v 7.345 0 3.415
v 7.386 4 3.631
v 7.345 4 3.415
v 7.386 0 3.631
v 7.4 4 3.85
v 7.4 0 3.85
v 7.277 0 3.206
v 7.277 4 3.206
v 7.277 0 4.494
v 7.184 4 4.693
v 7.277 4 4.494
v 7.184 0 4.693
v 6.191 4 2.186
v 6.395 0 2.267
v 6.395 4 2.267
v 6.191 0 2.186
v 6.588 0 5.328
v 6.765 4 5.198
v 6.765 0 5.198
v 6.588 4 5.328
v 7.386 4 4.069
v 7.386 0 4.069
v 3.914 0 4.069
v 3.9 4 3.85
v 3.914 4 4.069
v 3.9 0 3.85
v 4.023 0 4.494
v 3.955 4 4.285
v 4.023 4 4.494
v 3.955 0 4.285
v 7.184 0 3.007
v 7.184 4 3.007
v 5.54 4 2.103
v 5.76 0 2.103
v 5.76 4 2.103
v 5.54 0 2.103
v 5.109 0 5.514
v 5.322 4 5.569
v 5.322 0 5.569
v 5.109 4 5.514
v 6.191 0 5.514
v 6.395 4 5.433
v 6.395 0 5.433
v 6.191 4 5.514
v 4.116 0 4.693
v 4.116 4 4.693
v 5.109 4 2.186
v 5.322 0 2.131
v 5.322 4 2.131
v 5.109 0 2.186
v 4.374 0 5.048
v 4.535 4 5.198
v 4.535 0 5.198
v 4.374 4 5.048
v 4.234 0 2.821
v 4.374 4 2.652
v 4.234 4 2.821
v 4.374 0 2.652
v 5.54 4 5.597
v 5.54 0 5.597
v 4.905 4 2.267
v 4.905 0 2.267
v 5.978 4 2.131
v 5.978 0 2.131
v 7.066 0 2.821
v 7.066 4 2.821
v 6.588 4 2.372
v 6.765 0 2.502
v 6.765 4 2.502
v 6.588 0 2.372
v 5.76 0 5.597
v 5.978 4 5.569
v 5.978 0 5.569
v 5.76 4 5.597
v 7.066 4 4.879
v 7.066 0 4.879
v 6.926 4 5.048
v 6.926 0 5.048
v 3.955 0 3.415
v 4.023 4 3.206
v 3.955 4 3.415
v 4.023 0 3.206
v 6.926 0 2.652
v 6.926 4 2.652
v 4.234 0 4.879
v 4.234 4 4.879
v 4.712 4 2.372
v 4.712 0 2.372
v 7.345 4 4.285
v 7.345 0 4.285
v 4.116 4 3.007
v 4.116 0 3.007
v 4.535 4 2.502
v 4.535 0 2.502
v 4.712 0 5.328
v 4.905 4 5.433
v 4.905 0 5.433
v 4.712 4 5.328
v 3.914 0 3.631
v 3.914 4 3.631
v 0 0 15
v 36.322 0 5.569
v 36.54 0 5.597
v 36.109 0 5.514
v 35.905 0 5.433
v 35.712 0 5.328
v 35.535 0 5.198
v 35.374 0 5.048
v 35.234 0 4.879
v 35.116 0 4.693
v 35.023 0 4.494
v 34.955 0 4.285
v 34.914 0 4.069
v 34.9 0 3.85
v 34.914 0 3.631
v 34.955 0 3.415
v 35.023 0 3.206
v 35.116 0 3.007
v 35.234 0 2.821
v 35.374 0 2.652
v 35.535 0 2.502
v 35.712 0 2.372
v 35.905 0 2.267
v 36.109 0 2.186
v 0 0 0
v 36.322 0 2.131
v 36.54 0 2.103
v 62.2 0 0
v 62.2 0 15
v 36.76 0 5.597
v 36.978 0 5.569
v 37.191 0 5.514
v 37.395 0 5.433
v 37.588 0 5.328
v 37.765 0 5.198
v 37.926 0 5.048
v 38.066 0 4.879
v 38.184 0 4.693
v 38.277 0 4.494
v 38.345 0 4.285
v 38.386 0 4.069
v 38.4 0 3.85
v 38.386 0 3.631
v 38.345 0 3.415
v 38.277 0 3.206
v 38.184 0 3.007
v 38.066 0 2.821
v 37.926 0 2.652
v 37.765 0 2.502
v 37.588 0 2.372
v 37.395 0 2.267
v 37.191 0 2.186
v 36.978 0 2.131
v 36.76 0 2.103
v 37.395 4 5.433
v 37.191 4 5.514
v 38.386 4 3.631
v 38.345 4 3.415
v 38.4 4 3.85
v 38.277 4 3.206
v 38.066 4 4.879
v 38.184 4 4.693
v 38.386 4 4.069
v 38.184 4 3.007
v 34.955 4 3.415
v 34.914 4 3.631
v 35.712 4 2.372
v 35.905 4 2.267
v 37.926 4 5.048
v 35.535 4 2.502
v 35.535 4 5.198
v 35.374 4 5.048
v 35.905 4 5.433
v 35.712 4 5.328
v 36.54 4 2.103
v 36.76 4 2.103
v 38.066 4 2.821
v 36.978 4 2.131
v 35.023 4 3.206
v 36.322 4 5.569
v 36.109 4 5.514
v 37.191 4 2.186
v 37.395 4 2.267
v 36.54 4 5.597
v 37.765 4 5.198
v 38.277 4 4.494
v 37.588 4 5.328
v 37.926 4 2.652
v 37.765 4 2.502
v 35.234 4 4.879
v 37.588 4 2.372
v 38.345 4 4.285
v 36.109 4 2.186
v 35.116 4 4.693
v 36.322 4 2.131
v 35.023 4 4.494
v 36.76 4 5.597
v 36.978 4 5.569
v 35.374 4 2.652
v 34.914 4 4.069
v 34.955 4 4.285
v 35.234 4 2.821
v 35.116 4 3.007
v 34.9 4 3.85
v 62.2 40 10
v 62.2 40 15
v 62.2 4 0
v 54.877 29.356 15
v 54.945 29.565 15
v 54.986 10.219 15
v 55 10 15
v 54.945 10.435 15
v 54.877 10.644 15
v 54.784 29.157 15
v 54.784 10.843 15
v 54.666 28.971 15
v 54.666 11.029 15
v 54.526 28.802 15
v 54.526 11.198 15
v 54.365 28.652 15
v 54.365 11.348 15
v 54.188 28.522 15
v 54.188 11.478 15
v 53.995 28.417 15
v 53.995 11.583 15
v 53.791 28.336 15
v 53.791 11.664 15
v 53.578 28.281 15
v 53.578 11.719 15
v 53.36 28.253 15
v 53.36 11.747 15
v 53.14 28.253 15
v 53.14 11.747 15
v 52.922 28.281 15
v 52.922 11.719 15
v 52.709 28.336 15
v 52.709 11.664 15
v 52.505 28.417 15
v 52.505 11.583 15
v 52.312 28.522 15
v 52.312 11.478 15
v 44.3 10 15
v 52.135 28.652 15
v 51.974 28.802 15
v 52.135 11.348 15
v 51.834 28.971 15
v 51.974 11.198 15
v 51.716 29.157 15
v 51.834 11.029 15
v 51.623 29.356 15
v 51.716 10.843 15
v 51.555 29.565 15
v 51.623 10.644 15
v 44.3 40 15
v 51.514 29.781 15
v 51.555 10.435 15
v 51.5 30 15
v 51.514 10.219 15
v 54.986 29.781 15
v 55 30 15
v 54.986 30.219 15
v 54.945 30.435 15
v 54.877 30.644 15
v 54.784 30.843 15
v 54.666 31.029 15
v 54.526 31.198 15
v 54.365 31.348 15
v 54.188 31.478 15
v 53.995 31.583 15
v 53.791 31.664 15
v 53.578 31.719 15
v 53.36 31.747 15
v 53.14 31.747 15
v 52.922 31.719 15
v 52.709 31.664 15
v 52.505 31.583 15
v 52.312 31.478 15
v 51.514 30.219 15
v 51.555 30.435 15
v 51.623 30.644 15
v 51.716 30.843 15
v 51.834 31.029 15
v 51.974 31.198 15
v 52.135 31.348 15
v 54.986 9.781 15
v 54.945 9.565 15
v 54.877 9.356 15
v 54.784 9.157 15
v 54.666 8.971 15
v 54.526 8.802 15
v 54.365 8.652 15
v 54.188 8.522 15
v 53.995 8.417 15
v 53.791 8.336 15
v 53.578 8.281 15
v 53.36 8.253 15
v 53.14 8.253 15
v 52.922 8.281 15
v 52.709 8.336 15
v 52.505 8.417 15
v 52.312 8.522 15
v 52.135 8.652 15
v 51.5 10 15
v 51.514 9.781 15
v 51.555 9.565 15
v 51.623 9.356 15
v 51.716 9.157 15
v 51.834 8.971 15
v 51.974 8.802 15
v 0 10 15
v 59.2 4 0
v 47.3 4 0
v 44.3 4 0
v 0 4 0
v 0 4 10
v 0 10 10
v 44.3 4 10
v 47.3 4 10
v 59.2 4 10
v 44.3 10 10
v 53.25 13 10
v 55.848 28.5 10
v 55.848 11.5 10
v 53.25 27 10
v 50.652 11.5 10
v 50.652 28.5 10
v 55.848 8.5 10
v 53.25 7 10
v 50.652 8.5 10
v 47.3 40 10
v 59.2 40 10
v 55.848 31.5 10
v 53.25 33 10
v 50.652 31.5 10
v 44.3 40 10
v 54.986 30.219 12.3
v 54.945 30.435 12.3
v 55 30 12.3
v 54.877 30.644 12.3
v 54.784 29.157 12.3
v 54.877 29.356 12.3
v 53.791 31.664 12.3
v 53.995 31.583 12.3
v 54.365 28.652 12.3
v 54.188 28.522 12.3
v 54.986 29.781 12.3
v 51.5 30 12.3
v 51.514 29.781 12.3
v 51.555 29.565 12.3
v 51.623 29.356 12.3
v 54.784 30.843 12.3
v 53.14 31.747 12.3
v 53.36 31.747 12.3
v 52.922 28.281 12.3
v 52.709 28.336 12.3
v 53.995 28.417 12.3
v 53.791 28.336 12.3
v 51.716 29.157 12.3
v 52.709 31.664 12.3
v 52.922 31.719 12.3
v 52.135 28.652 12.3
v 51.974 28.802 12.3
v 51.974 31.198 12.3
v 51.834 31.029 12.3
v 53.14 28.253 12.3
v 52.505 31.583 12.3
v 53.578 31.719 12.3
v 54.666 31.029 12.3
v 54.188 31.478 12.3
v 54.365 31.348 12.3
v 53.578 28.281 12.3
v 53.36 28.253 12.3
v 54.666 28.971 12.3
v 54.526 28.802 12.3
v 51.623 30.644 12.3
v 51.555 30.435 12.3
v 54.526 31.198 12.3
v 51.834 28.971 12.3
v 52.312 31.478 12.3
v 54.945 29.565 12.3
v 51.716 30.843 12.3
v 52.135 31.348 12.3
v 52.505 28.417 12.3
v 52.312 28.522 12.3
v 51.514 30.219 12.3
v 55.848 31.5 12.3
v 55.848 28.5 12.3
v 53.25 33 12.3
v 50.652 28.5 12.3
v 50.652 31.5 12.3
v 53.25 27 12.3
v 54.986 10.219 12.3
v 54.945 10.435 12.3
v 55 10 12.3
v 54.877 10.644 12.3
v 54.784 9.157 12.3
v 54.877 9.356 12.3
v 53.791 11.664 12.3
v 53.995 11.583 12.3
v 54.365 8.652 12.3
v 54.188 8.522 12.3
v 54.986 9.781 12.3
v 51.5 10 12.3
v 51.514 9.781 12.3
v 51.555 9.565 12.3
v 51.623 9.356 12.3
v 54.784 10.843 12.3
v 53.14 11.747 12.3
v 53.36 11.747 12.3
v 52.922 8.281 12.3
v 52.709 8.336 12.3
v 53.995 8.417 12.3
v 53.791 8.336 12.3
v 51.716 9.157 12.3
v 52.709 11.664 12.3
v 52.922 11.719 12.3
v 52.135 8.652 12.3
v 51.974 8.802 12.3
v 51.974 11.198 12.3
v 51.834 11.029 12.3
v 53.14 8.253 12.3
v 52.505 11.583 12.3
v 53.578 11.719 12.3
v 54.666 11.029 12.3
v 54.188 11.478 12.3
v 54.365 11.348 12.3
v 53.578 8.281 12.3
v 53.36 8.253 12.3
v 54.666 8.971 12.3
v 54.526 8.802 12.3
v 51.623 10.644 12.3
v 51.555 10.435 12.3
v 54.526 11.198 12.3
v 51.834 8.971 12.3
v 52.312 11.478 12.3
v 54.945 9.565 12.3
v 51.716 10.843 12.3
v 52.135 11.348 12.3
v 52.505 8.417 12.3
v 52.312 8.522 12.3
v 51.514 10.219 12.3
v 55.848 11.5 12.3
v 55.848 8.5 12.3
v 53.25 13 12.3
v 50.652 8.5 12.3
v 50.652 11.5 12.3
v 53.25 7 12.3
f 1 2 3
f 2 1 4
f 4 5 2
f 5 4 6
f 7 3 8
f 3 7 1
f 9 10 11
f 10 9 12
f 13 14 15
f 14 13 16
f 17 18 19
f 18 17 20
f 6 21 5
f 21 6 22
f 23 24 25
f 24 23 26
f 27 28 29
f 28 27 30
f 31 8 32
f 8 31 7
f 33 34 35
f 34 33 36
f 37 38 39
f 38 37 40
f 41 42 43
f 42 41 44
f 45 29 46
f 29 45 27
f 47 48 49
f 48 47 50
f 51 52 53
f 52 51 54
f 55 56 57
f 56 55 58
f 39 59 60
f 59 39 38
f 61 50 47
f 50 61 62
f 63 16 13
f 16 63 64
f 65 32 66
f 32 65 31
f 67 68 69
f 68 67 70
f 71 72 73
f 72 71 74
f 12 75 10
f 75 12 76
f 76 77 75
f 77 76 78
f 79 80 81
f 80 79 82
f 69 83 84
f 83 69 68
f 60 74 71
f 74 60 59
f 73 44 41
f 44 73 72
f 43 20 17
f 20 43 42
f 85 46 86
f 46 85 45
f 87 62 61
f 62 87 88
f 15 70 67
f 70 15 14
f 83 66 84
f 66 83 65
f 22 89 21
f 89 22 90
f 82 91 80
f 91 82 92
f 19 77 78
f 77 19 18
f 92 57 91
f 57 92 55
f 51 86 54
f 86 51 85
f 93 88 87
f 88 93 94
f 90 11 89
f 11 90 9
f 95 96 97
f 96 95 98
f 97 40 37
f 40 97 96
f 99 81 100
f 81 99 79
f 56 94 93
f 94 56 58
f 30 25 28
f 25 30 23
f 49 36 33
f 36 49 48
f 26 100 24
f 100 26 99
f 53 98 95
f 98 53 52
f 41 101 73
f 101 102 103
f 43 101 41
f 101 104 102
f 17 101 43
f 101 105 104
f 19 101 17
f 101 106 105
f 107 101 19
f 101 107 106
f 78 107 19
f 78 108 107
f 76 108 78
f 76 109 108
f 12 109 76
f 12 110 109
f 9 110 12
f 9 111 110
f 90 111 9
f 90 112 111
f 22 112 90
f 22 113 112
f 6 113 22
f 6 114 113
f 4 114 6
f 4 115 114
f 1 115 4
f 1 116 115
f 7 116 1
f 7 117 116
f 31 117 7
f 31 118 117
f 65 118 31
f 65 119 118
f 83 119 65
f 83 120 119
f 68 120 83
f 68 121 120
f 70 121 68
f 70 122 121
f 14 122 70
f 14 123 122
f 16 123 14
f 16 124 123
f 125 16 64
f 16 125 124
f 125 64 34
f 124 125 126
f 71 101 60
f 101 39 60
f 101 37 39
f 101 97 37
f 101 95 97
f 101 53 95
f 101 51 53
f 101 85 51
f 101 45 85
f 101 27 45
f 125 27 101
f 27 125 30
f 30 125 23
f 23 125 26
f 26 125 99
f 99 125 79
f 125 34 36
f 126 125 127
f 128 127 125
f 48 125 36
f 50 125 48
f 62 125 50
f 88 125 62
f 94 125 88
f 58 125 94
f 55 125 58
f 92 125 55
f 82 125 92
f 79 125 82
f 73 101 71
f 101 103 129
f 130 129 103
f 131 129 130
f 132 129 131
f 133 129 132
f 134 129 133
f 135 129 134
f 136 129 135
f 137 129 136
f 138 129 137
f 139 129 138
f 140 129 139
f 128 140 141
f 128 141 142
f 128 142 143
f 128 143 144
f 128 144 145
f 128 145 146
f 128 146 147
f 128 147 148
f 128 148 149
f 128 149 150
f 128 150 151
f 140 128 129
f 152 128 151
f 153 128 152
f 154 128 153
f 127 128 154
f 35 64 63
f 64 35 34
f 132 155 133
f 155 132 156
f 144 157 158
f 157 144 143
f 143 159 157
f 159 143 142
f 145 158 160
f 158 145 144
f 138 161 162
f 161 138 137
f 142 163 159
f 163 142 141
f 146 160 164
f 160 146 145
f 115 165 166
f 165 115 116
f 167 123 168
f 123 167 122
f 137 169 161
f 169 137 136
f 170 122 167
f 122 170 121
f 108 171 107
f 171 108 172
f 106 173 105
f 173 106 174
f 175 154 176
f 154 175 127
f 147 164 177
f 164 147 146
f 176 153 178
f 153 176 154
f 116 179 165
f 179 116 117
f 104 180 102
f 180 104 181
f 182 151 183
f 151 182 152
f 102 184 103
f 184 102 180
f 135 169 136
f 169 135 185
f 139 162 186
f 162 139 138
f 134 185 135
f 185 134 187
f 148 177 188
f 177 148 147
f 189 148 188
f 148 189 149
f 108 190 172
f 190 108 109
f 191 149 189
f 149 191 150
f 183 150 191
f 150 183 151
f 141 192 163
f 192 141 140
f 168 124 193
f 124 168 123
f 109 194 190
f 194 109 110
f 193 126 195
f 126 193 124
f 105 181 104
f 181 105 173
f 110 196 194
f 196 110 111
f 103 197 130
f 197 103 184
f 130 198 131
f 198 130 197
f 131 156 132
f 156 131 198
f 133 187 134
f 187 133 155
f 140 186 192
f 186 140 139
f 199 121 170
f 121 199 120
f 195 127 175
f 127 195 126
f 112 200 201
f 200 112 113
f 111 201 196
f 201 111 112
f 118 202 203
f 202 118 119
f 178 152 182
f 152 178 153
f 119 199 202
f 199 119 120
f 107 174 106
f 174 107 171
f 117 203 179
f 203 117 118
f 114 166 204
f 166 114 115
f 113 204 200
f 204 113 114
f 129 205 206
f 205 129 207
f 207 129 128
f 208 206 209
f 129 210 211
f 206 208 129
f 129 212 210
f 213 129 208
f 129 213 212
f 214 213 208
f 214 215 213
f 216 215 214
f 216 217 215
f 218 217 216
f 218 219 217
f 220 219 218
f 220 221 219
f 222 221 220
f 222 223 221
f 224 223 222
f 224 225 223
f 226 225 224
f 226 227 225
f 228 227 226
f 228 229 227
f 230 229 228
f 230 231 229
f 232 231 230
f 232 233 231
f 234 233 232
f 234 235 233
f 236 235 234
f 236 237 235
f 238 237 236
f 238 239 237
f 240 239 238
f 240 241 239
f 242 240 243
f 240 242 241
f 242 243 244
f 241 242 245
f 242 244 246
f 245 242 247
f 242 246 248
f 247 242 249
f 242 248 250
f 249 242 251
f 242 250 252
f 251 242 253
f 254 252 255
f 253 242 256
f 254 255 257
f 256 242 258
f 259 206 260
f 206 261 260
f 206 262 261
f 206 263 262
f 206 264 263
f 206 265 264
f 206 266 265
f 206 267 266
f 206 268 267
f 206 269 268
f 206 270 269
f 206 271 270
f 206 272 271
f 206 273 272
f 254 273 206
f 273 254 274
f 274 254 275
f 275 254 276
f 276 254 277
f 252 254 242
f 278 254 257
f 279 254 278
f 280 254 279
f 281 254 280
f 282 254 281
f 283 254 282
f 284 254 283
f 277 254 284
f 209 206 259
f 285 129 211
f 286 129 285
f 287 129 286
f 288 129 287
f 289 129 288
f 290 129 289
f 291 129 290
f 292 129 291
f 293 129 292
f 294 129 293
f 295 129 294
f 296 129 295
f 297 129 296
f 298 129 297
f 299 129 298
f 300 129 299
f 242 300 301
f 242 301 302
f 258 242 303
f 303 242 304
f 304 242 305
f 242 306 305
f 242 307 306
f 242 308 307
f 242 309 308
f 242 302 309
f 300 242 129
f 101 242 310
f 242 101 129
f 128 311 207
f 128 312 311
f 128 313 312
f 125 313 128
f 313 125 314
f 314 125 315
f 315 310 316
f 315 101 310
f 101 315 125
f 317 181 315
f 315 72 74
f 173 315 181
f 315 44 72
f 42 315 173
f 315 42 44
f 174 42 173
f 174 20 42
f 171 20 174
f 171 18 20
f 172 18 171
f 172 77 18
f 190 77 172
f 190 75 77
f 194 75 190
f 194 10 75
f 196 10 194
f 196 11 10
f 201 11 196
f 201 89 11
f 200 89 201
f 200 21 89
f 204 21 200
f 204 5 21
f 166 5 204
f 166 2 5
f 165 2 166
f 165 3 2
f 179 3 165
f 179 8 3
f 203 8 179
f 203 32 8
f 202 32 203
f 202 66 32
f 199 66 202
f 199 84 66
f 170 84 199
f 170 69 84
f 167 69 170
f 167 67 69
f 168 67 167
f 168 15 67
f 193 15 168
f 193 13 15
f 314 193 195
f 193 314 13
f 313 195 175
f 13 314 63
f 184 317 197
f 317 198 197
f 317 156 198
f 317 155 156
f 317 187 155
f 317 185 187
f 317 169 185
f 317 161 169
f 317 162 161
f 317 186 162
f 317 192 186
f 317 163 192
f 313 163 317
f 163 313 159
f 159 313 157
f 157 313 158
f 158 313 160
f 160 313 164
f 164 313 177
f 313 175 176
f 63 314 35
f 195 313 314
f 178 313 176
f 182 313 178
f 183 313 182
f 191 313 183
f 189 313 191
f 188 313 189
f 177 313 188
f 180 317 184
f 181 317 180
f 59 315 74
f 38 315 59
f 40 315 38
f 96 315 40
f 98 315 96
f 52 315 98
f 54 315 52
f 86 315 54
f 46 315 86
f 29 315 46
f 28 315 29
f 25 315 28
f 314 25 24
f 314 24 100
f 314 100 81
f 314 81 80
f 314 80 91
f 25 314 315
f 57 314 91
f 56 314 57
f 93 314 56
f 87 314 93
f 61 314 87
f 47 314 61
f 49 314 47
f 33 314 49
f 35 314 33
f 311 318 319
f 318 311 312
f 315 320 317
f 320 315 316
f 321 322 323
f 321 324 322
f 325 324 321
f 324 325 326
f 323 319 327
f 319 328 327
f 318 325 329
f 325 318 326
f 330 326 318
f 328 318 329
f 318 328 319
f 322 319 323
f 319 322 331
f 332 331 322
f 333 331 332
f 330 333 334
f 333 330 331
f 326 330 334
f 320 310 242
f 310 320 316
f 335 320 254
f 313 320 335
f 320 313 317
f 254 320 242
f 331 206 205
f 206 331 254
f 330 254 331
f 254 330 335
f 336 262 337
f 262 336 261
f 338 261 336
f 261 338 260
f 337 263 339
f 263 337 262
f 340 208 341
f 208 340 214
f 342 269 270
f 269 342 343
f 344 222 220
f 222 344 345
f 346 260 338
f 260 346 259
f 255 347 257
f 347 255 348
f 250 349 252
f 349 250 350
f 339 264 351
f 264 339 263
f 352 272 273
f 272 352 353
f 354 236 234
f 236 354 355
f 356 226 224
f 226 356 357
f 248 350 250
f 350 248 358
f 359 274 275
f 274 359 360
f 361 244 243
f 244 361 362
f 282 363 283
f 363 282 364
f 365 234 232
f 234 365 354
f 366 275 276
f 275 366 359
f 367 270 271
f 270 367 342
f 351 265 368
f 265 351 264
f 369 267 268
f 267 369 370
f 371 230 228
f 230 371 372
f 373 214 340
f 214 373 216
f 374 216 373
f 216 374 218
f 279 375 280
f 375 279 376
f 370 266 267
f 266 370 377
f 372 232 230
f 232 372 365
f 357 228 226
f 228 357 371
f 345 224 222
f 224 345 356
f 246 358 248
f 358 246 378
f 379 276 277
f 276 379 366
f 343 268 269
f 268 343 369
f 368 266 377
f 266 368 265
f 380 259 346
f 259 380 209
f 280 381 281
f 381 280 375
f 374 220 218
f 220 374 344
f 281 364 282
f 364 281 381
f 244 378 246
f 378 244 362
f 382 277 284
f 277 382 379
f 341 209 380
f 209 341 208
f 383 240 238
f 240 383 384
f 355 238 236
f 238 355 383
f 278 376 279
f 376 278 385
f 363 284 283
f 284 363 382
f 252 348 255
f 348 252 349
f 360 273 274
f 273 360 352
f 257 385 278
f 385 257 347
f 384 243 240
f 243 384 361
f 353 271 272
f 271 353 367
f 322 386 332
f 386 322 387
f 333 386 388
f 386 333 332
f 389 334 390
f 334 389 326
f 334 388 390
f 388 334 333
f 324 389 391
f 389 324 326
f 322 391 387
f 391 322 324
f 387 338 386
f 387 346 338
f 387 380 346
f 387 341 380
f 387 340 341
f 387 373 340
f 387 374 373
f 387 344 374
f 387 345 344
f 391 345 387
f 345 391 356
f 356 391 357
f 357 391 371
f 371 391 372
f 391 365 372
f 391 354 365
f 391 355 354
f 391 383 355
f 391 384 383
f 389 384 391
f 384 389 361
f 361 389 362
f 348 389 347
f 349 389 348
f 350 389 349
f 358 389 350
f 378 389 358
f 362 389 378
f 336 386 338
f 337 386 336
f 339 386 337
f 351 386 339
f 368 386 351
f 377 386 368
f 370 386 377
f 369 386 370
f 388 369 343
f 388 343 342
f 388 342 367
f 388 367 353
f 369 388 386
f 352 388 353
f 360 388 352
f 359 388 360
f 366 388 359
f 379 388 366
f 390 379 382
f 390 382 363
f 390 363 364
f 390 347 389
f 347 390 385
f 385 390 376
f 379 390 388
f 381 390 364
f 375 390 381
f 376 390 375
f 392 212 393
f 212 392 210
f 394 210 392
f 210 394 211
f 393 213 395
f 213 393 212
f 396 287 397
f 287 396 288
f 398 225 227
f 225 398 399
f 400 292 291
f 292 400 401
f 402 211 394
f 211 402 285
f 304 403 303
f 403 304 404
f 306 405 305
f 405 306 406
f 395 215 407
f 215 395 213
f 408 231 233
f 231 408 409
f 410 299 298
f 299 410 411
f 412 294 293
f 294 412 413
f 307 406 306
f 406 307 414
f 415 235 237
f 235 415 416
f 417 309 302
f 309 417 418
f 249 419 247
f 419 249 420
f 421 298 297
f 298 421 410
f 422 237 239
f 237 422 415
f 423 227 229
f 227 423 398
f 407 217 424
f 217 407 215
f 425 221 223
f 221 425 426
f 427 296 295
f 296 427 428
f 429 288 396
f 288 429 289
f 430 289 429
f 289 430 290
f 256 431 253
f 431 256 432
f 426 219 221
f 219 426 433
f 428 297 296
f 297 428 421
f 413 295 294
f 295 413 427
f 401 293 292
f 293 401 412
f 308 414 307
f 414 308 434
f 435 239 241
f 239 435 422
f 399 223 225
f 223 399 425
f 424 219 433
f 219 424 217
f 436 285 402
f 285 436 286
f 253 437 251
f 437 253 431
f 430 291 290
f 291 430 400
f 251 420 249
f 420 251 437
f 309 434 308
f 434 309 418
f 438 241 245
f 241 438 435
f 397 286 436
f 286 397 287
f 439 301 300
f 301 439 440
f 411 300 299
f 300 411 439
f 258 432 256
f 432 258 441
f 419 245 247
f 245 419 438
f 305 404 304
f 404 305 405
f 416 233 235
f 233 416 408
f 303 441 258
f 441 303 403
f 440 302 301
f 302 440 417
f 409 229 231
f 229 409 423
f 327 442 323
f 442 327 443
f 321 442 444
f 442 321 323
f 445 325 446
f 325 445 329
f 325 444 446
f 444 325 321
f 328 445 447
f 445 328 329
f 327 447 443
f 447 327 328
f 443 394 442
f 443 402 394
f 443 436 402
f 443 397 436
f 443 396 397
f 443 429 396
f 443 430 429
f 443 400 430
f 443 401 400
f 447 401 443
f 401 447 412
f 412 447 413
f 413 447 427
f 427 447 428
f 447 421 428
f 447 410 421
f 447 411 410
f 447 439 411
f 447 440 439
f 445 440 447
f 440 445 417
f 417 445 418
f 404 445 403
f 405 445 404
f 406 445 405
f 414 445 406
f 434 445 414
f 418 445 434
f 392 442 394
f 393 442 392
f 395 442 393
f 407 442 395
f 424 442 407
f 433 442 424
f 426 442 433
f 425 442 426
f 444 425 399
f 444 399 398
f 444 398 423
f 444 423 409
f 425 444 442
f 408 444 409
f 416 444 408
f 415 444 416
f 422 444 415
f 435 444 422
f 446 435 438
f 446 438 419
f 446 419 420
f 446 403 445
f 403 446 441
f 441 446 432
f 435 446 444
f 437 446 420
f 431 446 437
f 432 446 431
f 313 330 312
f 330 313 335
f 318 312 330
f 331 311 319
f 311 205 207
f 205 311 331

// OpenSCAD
//**********************************************
// Cable rail mount for MPCNC build
//
// Written by Ippokratis Anastasiadis 2018
// using OpenSCAD 2015.03-2
// 
// Description : the mount is attached to the top edge of the stepper motors
// of the upper axis of the MPCNC build and serves the purpose of supporting
// the cables coming from the Z axis, such as stepper cable or spindle cable. 
// As is it supports an aluminum rail of ca 20 mm width, but can easily be adjusted to your needs. The rail is attached via M3 screws and corresponding nuts. 
//**********************************************

$fn = 50;

nema17_width = 42.3;
nema17_screw_spacing = 31;
nema17_screw_offset = (nema17_width-nema17_screw_spacing)/2;

rail_width = 19.4;
rail_thickness = 1.5;

rail_inner_width = rail_width - rail_thickness;

beam_thickness = 5;
beam_length = nema17_width + .5 + rail_width;
beam_overhang = 6;

face_thickness = 4;
face_height = 10+beam_thickness;

rail_mount_length = 40;
rib_thickness = 3;

M3_hole = 3.5;
M3_nut_hole = 6;
M3_nut_inset = 2.2;

cablerail_mount ();

module cablerail_mount () {
    face ();
    top ();
    translate([beam_length-rail_inner_width, 0, 0]) rib ();
    translate([beam_length-rib_thickness, 0, 0]) rib ();
}


module face () {
    difference() {
        cube ([beam_length, face_thickness, face_height]);
        // screwholes
        translate([nema17_screw_offset, 0, face_height-beam_thickness-nema17_screw_offset-.5])
        rotate([270,0,0])
        union() {
            cylinder (d=M3_hole, h=face_thickness+.1);                       
            translate([nema17_screw_spacing, 0, 0])
            cylinder (d=M3_hole, h=face_thickness+.1);            
        }
    }
}

module top () {
    translate([0, 0, face_height-beam_thickness])
    difference() {
        union() {
            cube ([beam_length, face_thickness+beam_overhang, beam_thickness]);
            translate([beam_length-rail_inner_width, 0, 0])
            cube ([rail_inner_width, rail_mount_length, beam_thickness]);
        }
        union() {
            // screwholes
            translate([beam_length-rail_inner_width/2, 30, 0])
            union() {
                cylinder (d=M3_hole, h=beam_thickness+.1);   
                rotate([0,0,90])
                cylinder (d=M3_nut_hole, h=M3_nut_inset+.1, $fn = 6);
            }
            translate([beam_length-rail_inner_width/2, 10, 0])
            union() {
                cylinder (d=M3_hole, h=beam_thickness+.1);   
                rotate([0,0,90])
                cylinder (d=M3_nut_hole, h=M3_nut_inset+.1, $fn = 6);
            }
        }
    }
}

module rib () {
    translate([0, 0, face_height-beam_thickness])
    rotate([0,90,0])
    linear_extrude(height = rib_thickness) 
    polygon(points = [[0,face_thickness], [0,rail_mount_length], [face_height-beam_thickness,face_thickness]]);
}

/*
foot_width = 40;
foot_depth = 20;
foot_thickness = 5;
foot_curve = 8;

face_thickness = 4;
face_curve = 10;
face_height = 50;
face_width = 40;

rib_thickness = 4;

foot_screw_hole = 4;
foot_screw_head = 7;
foot_screw_head_height = 2;
foot_screw_length = 20;
foot_screw_mount_diameter = 11;
foot_screw_mount_height = foot_thickness;


foot_screw_positions = [
    [(foot_width-rib_thickness)/4,face_thickness+(foot_depth-face_thickness)/2],
    [foot_width-(foot_width-rib_thickness)/4,face_thickness+(foot_depth-face_thickness)/2]
];

face_screw_offset = [9, 12];

face_screw_length = 20;
face_screw_mount_diameter = 11;
face_screw_mount_height = face_thickness;

face_screw_positions = [
    [foot_width/2+face_screw_offset[0],face_screw_offset[1]],
    [foot_width/2-face_screw_offset[0],face_screw_offset[1]],
    [foot_width/2,face_height-face_curve/2]
];

mount ();

module mount () {
    difference () {
        union() {
            foot();
            face();
            rib();
        }
        union() {
            foot_screws();
            face_screws();
        }
    }
}



module face () {
    hull () {
        translate([(foot_width-face_width)/2, 0, 0])
        cube ([face_width, face_thickness, foot_thickness]);
        translate([foot_width/2, 0, face_height-face_curve/2])
        rotate([270,0,0])
        cylinder (d=face_curve, h=face_thickness);
    }
}

module foot () {
    hull () {
        cube ([foot_width, foot_depth-foot_curve, foot_thickness]);
        translate([foot_curve/2, foot_depth-foot_curve/2, 0])
        cylinder (d=foot_curve, h=foot_thickness);
        translate([foot_width-foot_curve/2, foot_depth-foot_curve/2, 0])
        cylinder (d=foot_curve, h=foot_thickness);
    }
}

module face_screws() {
    
    for (pos=face_screw_positions) {
        translate([pos[0],-face_screw_length + face_screw_mount_height+.1,pos[1]])
        rotate([270,0,0])
        foot_screw();
    }
}

module foot_screws() {
    for (pos=foot_screw_positions) {
        translate([pos[0],pos[1],-foot_screw_length + foot_screw_mount_height])
        foot_screw();
    }
}

module foot_screw () {
    color ([.7,.7,.7]) union () {
    cylinder (d=foot_screw_hole, h=foot_screw_length-foot_screw_head_height);
    translate([0,0,foot_screw_length-foot_screw_head_height])
    cylinder (d1=foot_screw_hole, d2=foot_screw_head, h=foot_screw_head_height);
    }
}
*/
